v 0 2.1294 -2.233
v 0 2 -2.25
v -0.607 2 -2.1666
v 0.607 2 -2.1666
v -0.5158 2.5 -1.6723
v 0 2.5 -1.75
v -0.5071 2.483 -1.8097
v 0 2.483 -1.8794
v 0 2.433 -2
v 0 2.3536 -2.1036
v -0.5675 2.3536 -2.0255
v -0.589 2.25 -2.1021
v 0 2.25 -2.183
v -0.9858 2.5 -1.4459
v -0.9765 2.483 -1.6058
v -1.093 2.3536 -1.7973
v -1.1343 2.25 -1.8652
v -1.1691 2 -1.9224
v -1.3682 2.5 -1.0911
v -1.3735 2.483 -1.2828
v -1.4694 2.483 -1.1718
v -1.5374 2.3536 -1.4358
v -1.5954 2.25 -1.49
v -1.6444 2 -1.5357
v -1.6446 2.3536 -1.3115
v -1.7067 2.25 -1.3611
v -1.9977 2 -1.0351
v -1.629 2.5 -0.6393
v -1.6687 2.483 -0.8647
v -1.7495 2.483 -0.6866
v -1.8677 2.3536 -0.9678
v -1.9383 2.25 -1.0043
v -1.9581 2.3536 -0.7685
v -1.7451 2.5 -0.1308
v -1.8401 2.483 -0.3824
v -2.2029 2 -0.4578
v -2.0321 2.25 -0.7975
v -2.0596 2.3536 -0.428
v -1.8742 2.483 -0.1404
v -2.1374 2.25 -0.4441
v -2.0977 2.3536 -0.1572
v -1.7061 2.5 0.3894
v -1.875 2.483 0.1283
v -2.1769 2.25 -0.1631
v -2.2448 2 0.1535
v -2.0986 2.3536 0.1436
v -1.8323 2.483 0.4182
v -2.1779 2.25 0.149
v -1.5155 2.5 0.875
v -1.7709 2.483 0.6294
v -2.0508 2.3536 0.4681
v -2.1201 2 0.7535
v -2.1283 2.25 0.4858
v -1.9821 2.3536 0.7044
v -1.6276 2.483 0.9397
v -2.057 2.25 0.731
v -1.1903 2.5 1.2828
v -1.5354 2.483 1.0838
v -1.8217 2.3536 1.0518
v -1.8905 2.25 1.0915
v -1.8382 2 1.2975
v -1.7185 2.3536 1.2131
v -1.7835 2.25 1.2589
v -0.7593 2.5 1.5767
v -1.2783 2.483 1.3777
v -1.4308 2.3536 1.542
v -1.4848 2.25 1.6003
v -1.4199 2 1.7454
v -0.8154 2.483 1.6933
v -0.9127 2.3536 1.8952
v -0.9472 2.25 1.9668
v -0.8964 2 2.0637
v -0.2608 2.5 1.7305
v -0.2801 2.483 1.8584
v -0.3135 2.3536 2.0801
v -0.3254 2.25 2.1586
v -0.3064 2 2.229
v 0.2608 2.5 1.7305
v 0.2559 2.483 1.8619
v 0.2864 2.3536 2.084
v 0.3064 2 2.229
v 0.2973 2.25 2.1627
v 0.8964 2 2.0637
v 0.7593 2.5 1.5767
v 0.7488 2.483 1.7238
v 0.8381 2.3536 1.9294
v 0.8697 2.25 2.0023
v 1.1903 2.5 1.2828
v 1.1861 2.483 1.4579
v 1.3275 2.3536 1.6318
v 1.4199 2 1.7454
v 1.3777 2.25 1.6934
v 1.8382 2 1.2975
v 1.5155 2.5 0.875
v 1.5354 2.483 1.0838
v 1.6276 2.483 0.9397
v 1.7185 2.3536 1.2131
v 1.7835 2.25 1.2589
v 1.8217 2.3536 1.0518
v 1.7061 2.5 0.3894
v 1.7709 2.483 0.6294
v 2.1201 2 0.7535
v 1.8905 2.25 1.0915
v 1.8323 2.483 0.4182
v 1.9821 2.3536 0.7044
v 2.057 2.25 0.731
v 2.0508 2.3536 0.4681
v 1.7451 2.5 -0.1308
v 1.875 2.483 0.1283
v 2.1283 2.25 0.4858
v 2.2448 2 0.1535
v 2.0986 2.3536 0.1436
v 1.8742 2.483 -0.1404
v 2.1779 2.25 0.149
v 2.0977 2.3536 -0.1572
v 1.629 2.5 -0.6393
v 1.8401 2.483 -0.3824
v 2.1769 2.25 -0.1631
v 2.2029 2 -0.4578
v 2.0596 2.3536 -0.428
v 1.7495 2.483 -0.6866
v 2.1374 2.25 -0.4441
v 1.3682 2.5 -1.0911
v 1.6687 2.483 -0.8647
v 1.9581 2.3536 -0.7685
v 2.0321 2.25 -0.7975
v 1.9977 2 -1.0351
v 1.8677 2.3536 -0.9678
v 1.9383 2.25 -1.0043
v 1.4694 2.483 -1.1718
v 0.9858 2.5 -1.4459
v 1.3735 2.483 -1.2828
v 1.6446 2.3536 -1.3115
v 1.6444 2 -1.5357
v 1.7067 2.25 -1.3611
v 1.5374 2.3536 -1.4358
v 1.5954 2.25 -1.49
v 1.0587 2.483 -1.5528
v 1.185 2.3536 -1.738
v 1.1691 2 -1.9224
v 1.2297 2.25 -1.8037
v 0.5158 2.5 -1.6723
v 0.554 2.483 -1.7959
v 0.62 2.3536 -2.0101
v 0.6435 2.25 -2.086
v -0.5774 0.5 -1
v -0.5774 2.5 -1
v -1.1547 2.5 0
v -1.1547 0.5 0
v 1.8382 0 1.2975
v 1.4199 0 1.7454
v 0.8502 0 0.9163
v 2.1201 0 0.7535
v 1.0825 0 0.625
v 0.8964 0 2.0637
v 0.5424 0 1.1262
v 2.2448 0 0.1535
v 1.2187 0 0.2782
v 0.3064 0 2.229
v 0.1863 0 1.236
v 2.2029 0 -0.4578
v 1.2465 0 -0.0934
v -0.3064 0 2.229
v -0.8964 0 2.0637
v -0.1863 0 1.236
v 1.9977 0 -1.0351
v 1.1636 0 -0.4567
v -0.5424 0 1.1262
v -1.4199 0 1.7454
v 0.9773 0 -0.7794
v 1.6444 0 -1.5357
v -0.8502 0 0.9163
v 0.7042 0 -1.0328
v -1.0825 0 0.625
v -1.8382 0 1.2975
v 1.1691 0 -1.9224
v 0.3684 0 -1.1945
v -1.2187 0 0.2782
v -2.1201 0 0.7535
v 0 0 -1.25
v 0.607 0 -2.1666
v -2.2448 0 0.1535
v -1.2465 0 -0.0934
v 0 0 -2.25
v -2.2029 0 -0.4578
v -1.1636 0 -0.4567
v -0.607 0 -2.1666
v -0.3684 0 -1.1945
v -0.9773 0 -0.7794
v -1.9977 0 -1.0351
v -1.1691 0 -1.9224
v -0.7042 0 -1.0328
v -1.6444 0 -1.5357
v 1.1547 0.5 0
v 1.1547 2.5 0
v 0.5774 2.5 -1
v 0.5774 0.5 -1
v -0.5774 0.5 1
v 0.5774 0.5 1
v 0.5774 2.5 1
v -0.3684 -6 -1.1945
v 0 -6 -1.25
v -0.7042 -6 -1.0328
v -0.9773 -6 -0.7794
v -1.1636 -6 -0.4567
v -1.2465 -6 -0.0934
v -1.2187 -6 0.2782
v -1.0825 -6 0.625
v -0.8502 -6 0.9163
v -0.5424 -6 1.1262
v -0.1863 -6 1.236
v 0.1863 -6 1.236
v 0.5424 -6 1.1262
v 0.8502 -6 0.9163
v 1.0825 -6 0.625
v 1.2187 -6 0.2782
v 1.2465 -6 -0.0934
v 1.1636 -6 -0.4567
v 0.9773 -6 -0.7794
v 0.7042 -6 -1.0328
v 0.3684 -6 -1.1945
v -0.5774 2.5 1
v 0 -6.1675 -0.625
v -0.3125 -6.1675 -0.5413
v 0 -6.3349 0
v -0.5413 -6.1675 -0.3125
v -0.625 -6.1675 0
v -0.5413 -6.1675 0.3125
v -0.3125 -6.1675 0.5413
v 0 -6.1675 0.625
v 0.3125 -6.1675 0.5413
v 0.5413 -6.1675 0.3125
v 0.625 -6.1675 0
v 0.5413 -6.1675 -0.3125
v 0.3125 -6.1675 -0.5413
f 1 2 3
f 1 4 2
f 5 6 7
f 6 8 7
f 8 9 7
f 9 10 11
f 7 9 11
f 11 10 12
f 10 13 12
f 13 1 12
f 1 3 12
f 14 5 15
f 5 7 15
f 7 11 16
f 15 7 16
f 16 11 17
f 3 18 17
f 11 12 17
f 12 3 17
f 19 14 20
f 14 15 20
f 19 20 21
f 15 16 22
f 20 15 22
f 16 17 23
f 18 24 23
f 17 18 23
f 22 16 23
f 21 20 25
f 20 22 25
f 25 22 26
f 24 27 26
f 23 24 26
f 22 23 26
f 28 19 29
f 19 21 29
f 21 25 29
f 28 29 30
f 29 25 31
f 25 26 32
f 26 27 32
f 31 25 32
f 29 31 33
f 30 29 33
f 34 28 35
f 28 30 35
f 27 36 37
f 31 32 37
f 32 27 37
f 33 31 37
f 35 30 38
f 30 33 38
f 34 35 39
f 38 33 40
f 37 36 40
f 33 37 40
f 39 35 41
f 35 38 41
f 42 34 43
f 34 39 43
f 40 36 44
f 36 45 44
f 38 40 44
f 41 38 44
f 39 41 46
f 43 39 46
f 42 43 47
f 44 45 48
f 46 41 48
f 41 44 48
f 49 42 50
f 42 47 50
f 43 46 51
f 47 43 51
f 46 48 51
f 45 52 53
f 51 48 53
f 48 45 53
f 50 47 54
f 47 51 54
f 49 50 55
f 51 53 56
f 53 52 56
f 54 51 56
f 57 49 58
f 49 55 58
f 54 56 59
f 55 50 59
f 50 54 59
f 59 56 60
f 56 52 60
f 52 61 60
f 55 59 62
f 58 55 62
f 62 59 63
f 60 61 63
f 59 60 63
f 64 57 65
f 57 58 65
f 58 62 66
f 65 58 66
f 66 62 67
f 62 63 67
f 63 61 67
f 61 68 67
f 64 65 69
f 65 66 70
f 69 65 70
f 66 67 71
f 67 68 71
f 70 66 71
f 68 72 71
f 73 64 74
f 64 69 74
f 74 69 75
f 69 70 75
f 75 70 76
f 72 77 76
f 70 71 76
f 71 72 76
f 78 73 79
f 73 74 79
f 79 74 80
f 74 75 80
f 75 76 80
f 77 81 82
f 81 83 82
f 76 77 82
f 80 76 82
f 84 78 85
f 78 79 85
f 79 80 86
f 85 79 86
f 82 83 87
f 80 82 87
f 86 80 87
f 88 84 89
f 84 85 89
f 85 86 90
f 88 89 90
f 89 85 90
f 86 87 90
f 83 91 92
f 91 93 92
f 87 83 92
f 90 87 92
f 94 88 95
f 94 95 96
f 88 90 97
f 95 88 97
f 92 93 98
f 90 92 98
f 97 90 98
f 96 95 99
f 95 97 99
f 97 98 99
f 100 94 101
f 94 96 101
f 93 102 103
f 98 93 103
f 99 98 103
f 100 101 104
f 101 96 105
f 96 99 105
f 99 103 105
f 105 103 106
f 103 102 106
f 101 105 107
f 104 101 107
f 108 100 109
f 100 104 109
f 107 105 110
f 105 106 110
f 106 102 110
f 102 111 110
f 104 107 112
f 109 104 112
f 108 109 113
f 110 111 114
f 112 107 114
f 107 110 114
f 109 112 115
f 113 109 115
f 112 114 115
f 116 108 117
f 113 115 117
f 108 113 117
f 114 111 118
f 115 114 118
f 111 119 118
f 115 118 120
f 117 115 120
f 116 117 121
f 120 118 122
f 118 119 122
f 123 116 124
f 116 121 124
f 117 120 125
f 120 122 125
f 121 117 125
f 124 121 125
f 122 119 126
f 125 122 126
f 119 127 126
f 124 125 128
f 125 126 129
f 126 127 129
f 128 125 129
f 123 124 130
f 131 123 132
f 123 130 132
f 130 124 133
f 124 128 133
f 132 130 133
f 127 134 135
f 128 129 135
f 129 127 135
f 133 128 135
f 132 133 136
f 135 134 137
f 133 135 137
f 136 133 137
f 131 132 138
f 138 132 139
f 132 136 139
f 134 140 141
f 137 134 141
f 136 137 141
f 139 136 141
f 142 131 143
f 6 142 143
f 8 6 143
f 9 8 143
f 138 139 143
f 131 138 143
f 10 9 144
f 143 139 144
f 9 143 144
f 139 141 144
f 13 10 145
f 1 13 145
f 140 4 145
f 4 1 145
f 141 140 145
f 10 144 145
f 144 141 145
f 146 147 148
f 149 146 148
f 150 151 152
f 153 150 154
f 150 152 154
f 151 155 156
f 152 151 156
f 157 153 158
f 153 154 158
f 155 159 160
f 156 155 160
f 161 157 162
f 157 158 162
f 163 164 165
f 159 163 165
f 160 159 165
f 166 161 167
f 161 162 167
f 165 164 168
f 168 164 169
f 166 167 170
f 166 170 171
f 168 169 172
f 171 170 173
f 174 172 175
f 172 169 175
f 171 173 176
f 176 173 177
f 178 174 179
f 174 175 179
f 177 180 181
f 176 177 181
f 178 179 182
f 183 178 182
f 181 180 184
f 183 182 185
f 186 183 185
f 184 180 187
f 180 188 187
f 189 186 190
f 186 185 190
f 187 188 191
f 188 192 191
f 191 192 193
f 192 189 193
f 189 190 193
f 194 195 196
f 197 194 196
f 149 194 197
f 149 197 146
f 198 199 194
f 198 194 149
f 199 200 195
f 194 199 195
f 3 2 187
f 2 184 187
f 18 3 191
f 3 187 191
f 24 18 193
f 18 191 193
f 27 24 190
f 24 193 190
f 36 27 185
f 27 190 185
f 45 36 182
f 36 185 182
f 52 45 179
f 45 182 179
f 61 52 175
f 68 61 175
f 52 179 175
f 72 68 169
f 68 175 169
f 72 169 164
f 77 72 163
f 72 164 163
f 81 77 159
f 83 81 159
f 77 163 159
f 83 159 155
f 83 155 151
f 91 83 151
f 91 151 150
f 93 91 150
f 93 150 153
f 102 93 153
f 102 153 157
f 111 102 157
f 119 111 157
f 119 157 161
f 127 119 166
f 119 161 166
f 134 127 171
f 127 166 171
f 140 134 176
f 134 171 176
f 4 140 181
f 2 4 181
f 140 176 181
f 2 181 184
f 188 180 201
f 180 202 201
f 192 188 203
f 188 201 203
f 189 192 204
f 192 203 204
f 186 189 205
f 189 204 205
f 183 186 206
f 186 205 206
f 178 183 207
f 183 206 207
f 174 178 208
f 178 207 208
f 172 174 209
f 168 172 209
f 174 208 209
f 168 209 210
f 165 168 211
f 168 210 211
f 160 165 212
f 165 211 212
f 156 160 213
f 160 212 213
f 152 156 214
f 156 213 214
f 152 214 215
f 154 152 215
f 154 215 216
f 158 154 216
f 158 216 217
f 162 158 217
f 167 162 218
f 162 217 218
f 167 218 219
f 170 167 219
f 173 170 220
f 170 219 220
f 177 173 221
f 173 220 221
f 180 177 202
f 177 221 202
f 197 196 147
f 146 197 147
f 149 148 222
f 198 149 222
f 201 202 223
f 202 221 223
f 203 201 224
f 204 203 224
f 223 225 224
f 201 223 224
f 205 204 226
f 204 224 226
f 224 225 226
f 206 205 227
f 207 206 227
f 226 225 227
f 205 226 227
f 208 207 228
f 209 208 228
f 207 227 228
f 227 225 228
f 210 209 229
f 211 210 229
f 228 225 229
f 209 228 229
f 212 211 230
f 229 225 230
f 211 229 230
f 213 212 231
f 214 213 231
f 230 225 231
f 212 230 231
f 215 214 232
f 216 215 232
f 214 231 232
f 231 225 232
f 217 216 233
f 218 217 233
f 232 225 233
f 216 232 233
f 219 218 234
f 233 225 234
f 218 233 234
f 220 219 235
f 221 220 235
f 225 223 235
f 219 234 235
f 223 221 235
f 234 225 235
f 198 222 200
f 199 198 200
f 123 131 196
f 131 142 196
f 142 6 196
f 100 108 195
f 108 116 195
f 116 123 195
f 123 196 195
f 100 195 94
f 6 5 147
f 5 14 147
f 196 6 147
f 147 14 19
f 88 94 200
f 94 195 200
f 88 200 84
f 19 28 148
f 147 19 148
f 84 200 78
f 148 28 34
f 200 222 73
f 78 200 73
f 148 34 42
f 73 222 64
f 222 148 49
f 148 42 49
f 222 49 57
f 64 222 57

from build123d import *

# Parameters (mm, degrees)
CUT_EXTRUDE1_DEPTH = 2


with BuildPart() as part:
    # Sketch1 → Base-Revolve (revolve)
    with BuildSketch(Plane.XY, mode=Mode.PRIVATE) as base_revolve_sk:
        with BuildLine():
            Line((0, -6.334936491), (0, 2.5))
            Line((0, 2.5), (1.75, 2.5))
            ThreePointArc((1.75, 2.5), (2.103553391, 2.353553391), (2.25, 2))
            Line((2.25, 2), (2.25, 0))
            Line((2.25, 0), (1.25, 0))
            Line((1.25, 0), (1.25, -6))
            Line((1.25, -6), (0, -6.334936491))
        make_face()
    revolve(base_revolve_sk.sketch.rotate(Axis((0, 2.5, 0), (0, 1, 0)), 90), axis=Axis((0, 2.5, 0), (0, 1, 0)))  # turned: the seam where the file's is

    # Sketch2 → Cut-Extrude1 (cut)
    with BuildSketch(Plane(origin=(0, 2.5, 0), x_dir=(-1, 0, 0), z_dir=(0, 1, 0))):
        Polygon((-1.154700538, 0), (-0.577350269, -1), (0.577350269, -1), (1.154700538, 0), (0.577350269, 1), (-0.577350269, 1), align=None)
    extrude(amount=-CUT_EXTRUDE1_DEPTH, mode=Mode.SUBTRACT)


solid = part.part
